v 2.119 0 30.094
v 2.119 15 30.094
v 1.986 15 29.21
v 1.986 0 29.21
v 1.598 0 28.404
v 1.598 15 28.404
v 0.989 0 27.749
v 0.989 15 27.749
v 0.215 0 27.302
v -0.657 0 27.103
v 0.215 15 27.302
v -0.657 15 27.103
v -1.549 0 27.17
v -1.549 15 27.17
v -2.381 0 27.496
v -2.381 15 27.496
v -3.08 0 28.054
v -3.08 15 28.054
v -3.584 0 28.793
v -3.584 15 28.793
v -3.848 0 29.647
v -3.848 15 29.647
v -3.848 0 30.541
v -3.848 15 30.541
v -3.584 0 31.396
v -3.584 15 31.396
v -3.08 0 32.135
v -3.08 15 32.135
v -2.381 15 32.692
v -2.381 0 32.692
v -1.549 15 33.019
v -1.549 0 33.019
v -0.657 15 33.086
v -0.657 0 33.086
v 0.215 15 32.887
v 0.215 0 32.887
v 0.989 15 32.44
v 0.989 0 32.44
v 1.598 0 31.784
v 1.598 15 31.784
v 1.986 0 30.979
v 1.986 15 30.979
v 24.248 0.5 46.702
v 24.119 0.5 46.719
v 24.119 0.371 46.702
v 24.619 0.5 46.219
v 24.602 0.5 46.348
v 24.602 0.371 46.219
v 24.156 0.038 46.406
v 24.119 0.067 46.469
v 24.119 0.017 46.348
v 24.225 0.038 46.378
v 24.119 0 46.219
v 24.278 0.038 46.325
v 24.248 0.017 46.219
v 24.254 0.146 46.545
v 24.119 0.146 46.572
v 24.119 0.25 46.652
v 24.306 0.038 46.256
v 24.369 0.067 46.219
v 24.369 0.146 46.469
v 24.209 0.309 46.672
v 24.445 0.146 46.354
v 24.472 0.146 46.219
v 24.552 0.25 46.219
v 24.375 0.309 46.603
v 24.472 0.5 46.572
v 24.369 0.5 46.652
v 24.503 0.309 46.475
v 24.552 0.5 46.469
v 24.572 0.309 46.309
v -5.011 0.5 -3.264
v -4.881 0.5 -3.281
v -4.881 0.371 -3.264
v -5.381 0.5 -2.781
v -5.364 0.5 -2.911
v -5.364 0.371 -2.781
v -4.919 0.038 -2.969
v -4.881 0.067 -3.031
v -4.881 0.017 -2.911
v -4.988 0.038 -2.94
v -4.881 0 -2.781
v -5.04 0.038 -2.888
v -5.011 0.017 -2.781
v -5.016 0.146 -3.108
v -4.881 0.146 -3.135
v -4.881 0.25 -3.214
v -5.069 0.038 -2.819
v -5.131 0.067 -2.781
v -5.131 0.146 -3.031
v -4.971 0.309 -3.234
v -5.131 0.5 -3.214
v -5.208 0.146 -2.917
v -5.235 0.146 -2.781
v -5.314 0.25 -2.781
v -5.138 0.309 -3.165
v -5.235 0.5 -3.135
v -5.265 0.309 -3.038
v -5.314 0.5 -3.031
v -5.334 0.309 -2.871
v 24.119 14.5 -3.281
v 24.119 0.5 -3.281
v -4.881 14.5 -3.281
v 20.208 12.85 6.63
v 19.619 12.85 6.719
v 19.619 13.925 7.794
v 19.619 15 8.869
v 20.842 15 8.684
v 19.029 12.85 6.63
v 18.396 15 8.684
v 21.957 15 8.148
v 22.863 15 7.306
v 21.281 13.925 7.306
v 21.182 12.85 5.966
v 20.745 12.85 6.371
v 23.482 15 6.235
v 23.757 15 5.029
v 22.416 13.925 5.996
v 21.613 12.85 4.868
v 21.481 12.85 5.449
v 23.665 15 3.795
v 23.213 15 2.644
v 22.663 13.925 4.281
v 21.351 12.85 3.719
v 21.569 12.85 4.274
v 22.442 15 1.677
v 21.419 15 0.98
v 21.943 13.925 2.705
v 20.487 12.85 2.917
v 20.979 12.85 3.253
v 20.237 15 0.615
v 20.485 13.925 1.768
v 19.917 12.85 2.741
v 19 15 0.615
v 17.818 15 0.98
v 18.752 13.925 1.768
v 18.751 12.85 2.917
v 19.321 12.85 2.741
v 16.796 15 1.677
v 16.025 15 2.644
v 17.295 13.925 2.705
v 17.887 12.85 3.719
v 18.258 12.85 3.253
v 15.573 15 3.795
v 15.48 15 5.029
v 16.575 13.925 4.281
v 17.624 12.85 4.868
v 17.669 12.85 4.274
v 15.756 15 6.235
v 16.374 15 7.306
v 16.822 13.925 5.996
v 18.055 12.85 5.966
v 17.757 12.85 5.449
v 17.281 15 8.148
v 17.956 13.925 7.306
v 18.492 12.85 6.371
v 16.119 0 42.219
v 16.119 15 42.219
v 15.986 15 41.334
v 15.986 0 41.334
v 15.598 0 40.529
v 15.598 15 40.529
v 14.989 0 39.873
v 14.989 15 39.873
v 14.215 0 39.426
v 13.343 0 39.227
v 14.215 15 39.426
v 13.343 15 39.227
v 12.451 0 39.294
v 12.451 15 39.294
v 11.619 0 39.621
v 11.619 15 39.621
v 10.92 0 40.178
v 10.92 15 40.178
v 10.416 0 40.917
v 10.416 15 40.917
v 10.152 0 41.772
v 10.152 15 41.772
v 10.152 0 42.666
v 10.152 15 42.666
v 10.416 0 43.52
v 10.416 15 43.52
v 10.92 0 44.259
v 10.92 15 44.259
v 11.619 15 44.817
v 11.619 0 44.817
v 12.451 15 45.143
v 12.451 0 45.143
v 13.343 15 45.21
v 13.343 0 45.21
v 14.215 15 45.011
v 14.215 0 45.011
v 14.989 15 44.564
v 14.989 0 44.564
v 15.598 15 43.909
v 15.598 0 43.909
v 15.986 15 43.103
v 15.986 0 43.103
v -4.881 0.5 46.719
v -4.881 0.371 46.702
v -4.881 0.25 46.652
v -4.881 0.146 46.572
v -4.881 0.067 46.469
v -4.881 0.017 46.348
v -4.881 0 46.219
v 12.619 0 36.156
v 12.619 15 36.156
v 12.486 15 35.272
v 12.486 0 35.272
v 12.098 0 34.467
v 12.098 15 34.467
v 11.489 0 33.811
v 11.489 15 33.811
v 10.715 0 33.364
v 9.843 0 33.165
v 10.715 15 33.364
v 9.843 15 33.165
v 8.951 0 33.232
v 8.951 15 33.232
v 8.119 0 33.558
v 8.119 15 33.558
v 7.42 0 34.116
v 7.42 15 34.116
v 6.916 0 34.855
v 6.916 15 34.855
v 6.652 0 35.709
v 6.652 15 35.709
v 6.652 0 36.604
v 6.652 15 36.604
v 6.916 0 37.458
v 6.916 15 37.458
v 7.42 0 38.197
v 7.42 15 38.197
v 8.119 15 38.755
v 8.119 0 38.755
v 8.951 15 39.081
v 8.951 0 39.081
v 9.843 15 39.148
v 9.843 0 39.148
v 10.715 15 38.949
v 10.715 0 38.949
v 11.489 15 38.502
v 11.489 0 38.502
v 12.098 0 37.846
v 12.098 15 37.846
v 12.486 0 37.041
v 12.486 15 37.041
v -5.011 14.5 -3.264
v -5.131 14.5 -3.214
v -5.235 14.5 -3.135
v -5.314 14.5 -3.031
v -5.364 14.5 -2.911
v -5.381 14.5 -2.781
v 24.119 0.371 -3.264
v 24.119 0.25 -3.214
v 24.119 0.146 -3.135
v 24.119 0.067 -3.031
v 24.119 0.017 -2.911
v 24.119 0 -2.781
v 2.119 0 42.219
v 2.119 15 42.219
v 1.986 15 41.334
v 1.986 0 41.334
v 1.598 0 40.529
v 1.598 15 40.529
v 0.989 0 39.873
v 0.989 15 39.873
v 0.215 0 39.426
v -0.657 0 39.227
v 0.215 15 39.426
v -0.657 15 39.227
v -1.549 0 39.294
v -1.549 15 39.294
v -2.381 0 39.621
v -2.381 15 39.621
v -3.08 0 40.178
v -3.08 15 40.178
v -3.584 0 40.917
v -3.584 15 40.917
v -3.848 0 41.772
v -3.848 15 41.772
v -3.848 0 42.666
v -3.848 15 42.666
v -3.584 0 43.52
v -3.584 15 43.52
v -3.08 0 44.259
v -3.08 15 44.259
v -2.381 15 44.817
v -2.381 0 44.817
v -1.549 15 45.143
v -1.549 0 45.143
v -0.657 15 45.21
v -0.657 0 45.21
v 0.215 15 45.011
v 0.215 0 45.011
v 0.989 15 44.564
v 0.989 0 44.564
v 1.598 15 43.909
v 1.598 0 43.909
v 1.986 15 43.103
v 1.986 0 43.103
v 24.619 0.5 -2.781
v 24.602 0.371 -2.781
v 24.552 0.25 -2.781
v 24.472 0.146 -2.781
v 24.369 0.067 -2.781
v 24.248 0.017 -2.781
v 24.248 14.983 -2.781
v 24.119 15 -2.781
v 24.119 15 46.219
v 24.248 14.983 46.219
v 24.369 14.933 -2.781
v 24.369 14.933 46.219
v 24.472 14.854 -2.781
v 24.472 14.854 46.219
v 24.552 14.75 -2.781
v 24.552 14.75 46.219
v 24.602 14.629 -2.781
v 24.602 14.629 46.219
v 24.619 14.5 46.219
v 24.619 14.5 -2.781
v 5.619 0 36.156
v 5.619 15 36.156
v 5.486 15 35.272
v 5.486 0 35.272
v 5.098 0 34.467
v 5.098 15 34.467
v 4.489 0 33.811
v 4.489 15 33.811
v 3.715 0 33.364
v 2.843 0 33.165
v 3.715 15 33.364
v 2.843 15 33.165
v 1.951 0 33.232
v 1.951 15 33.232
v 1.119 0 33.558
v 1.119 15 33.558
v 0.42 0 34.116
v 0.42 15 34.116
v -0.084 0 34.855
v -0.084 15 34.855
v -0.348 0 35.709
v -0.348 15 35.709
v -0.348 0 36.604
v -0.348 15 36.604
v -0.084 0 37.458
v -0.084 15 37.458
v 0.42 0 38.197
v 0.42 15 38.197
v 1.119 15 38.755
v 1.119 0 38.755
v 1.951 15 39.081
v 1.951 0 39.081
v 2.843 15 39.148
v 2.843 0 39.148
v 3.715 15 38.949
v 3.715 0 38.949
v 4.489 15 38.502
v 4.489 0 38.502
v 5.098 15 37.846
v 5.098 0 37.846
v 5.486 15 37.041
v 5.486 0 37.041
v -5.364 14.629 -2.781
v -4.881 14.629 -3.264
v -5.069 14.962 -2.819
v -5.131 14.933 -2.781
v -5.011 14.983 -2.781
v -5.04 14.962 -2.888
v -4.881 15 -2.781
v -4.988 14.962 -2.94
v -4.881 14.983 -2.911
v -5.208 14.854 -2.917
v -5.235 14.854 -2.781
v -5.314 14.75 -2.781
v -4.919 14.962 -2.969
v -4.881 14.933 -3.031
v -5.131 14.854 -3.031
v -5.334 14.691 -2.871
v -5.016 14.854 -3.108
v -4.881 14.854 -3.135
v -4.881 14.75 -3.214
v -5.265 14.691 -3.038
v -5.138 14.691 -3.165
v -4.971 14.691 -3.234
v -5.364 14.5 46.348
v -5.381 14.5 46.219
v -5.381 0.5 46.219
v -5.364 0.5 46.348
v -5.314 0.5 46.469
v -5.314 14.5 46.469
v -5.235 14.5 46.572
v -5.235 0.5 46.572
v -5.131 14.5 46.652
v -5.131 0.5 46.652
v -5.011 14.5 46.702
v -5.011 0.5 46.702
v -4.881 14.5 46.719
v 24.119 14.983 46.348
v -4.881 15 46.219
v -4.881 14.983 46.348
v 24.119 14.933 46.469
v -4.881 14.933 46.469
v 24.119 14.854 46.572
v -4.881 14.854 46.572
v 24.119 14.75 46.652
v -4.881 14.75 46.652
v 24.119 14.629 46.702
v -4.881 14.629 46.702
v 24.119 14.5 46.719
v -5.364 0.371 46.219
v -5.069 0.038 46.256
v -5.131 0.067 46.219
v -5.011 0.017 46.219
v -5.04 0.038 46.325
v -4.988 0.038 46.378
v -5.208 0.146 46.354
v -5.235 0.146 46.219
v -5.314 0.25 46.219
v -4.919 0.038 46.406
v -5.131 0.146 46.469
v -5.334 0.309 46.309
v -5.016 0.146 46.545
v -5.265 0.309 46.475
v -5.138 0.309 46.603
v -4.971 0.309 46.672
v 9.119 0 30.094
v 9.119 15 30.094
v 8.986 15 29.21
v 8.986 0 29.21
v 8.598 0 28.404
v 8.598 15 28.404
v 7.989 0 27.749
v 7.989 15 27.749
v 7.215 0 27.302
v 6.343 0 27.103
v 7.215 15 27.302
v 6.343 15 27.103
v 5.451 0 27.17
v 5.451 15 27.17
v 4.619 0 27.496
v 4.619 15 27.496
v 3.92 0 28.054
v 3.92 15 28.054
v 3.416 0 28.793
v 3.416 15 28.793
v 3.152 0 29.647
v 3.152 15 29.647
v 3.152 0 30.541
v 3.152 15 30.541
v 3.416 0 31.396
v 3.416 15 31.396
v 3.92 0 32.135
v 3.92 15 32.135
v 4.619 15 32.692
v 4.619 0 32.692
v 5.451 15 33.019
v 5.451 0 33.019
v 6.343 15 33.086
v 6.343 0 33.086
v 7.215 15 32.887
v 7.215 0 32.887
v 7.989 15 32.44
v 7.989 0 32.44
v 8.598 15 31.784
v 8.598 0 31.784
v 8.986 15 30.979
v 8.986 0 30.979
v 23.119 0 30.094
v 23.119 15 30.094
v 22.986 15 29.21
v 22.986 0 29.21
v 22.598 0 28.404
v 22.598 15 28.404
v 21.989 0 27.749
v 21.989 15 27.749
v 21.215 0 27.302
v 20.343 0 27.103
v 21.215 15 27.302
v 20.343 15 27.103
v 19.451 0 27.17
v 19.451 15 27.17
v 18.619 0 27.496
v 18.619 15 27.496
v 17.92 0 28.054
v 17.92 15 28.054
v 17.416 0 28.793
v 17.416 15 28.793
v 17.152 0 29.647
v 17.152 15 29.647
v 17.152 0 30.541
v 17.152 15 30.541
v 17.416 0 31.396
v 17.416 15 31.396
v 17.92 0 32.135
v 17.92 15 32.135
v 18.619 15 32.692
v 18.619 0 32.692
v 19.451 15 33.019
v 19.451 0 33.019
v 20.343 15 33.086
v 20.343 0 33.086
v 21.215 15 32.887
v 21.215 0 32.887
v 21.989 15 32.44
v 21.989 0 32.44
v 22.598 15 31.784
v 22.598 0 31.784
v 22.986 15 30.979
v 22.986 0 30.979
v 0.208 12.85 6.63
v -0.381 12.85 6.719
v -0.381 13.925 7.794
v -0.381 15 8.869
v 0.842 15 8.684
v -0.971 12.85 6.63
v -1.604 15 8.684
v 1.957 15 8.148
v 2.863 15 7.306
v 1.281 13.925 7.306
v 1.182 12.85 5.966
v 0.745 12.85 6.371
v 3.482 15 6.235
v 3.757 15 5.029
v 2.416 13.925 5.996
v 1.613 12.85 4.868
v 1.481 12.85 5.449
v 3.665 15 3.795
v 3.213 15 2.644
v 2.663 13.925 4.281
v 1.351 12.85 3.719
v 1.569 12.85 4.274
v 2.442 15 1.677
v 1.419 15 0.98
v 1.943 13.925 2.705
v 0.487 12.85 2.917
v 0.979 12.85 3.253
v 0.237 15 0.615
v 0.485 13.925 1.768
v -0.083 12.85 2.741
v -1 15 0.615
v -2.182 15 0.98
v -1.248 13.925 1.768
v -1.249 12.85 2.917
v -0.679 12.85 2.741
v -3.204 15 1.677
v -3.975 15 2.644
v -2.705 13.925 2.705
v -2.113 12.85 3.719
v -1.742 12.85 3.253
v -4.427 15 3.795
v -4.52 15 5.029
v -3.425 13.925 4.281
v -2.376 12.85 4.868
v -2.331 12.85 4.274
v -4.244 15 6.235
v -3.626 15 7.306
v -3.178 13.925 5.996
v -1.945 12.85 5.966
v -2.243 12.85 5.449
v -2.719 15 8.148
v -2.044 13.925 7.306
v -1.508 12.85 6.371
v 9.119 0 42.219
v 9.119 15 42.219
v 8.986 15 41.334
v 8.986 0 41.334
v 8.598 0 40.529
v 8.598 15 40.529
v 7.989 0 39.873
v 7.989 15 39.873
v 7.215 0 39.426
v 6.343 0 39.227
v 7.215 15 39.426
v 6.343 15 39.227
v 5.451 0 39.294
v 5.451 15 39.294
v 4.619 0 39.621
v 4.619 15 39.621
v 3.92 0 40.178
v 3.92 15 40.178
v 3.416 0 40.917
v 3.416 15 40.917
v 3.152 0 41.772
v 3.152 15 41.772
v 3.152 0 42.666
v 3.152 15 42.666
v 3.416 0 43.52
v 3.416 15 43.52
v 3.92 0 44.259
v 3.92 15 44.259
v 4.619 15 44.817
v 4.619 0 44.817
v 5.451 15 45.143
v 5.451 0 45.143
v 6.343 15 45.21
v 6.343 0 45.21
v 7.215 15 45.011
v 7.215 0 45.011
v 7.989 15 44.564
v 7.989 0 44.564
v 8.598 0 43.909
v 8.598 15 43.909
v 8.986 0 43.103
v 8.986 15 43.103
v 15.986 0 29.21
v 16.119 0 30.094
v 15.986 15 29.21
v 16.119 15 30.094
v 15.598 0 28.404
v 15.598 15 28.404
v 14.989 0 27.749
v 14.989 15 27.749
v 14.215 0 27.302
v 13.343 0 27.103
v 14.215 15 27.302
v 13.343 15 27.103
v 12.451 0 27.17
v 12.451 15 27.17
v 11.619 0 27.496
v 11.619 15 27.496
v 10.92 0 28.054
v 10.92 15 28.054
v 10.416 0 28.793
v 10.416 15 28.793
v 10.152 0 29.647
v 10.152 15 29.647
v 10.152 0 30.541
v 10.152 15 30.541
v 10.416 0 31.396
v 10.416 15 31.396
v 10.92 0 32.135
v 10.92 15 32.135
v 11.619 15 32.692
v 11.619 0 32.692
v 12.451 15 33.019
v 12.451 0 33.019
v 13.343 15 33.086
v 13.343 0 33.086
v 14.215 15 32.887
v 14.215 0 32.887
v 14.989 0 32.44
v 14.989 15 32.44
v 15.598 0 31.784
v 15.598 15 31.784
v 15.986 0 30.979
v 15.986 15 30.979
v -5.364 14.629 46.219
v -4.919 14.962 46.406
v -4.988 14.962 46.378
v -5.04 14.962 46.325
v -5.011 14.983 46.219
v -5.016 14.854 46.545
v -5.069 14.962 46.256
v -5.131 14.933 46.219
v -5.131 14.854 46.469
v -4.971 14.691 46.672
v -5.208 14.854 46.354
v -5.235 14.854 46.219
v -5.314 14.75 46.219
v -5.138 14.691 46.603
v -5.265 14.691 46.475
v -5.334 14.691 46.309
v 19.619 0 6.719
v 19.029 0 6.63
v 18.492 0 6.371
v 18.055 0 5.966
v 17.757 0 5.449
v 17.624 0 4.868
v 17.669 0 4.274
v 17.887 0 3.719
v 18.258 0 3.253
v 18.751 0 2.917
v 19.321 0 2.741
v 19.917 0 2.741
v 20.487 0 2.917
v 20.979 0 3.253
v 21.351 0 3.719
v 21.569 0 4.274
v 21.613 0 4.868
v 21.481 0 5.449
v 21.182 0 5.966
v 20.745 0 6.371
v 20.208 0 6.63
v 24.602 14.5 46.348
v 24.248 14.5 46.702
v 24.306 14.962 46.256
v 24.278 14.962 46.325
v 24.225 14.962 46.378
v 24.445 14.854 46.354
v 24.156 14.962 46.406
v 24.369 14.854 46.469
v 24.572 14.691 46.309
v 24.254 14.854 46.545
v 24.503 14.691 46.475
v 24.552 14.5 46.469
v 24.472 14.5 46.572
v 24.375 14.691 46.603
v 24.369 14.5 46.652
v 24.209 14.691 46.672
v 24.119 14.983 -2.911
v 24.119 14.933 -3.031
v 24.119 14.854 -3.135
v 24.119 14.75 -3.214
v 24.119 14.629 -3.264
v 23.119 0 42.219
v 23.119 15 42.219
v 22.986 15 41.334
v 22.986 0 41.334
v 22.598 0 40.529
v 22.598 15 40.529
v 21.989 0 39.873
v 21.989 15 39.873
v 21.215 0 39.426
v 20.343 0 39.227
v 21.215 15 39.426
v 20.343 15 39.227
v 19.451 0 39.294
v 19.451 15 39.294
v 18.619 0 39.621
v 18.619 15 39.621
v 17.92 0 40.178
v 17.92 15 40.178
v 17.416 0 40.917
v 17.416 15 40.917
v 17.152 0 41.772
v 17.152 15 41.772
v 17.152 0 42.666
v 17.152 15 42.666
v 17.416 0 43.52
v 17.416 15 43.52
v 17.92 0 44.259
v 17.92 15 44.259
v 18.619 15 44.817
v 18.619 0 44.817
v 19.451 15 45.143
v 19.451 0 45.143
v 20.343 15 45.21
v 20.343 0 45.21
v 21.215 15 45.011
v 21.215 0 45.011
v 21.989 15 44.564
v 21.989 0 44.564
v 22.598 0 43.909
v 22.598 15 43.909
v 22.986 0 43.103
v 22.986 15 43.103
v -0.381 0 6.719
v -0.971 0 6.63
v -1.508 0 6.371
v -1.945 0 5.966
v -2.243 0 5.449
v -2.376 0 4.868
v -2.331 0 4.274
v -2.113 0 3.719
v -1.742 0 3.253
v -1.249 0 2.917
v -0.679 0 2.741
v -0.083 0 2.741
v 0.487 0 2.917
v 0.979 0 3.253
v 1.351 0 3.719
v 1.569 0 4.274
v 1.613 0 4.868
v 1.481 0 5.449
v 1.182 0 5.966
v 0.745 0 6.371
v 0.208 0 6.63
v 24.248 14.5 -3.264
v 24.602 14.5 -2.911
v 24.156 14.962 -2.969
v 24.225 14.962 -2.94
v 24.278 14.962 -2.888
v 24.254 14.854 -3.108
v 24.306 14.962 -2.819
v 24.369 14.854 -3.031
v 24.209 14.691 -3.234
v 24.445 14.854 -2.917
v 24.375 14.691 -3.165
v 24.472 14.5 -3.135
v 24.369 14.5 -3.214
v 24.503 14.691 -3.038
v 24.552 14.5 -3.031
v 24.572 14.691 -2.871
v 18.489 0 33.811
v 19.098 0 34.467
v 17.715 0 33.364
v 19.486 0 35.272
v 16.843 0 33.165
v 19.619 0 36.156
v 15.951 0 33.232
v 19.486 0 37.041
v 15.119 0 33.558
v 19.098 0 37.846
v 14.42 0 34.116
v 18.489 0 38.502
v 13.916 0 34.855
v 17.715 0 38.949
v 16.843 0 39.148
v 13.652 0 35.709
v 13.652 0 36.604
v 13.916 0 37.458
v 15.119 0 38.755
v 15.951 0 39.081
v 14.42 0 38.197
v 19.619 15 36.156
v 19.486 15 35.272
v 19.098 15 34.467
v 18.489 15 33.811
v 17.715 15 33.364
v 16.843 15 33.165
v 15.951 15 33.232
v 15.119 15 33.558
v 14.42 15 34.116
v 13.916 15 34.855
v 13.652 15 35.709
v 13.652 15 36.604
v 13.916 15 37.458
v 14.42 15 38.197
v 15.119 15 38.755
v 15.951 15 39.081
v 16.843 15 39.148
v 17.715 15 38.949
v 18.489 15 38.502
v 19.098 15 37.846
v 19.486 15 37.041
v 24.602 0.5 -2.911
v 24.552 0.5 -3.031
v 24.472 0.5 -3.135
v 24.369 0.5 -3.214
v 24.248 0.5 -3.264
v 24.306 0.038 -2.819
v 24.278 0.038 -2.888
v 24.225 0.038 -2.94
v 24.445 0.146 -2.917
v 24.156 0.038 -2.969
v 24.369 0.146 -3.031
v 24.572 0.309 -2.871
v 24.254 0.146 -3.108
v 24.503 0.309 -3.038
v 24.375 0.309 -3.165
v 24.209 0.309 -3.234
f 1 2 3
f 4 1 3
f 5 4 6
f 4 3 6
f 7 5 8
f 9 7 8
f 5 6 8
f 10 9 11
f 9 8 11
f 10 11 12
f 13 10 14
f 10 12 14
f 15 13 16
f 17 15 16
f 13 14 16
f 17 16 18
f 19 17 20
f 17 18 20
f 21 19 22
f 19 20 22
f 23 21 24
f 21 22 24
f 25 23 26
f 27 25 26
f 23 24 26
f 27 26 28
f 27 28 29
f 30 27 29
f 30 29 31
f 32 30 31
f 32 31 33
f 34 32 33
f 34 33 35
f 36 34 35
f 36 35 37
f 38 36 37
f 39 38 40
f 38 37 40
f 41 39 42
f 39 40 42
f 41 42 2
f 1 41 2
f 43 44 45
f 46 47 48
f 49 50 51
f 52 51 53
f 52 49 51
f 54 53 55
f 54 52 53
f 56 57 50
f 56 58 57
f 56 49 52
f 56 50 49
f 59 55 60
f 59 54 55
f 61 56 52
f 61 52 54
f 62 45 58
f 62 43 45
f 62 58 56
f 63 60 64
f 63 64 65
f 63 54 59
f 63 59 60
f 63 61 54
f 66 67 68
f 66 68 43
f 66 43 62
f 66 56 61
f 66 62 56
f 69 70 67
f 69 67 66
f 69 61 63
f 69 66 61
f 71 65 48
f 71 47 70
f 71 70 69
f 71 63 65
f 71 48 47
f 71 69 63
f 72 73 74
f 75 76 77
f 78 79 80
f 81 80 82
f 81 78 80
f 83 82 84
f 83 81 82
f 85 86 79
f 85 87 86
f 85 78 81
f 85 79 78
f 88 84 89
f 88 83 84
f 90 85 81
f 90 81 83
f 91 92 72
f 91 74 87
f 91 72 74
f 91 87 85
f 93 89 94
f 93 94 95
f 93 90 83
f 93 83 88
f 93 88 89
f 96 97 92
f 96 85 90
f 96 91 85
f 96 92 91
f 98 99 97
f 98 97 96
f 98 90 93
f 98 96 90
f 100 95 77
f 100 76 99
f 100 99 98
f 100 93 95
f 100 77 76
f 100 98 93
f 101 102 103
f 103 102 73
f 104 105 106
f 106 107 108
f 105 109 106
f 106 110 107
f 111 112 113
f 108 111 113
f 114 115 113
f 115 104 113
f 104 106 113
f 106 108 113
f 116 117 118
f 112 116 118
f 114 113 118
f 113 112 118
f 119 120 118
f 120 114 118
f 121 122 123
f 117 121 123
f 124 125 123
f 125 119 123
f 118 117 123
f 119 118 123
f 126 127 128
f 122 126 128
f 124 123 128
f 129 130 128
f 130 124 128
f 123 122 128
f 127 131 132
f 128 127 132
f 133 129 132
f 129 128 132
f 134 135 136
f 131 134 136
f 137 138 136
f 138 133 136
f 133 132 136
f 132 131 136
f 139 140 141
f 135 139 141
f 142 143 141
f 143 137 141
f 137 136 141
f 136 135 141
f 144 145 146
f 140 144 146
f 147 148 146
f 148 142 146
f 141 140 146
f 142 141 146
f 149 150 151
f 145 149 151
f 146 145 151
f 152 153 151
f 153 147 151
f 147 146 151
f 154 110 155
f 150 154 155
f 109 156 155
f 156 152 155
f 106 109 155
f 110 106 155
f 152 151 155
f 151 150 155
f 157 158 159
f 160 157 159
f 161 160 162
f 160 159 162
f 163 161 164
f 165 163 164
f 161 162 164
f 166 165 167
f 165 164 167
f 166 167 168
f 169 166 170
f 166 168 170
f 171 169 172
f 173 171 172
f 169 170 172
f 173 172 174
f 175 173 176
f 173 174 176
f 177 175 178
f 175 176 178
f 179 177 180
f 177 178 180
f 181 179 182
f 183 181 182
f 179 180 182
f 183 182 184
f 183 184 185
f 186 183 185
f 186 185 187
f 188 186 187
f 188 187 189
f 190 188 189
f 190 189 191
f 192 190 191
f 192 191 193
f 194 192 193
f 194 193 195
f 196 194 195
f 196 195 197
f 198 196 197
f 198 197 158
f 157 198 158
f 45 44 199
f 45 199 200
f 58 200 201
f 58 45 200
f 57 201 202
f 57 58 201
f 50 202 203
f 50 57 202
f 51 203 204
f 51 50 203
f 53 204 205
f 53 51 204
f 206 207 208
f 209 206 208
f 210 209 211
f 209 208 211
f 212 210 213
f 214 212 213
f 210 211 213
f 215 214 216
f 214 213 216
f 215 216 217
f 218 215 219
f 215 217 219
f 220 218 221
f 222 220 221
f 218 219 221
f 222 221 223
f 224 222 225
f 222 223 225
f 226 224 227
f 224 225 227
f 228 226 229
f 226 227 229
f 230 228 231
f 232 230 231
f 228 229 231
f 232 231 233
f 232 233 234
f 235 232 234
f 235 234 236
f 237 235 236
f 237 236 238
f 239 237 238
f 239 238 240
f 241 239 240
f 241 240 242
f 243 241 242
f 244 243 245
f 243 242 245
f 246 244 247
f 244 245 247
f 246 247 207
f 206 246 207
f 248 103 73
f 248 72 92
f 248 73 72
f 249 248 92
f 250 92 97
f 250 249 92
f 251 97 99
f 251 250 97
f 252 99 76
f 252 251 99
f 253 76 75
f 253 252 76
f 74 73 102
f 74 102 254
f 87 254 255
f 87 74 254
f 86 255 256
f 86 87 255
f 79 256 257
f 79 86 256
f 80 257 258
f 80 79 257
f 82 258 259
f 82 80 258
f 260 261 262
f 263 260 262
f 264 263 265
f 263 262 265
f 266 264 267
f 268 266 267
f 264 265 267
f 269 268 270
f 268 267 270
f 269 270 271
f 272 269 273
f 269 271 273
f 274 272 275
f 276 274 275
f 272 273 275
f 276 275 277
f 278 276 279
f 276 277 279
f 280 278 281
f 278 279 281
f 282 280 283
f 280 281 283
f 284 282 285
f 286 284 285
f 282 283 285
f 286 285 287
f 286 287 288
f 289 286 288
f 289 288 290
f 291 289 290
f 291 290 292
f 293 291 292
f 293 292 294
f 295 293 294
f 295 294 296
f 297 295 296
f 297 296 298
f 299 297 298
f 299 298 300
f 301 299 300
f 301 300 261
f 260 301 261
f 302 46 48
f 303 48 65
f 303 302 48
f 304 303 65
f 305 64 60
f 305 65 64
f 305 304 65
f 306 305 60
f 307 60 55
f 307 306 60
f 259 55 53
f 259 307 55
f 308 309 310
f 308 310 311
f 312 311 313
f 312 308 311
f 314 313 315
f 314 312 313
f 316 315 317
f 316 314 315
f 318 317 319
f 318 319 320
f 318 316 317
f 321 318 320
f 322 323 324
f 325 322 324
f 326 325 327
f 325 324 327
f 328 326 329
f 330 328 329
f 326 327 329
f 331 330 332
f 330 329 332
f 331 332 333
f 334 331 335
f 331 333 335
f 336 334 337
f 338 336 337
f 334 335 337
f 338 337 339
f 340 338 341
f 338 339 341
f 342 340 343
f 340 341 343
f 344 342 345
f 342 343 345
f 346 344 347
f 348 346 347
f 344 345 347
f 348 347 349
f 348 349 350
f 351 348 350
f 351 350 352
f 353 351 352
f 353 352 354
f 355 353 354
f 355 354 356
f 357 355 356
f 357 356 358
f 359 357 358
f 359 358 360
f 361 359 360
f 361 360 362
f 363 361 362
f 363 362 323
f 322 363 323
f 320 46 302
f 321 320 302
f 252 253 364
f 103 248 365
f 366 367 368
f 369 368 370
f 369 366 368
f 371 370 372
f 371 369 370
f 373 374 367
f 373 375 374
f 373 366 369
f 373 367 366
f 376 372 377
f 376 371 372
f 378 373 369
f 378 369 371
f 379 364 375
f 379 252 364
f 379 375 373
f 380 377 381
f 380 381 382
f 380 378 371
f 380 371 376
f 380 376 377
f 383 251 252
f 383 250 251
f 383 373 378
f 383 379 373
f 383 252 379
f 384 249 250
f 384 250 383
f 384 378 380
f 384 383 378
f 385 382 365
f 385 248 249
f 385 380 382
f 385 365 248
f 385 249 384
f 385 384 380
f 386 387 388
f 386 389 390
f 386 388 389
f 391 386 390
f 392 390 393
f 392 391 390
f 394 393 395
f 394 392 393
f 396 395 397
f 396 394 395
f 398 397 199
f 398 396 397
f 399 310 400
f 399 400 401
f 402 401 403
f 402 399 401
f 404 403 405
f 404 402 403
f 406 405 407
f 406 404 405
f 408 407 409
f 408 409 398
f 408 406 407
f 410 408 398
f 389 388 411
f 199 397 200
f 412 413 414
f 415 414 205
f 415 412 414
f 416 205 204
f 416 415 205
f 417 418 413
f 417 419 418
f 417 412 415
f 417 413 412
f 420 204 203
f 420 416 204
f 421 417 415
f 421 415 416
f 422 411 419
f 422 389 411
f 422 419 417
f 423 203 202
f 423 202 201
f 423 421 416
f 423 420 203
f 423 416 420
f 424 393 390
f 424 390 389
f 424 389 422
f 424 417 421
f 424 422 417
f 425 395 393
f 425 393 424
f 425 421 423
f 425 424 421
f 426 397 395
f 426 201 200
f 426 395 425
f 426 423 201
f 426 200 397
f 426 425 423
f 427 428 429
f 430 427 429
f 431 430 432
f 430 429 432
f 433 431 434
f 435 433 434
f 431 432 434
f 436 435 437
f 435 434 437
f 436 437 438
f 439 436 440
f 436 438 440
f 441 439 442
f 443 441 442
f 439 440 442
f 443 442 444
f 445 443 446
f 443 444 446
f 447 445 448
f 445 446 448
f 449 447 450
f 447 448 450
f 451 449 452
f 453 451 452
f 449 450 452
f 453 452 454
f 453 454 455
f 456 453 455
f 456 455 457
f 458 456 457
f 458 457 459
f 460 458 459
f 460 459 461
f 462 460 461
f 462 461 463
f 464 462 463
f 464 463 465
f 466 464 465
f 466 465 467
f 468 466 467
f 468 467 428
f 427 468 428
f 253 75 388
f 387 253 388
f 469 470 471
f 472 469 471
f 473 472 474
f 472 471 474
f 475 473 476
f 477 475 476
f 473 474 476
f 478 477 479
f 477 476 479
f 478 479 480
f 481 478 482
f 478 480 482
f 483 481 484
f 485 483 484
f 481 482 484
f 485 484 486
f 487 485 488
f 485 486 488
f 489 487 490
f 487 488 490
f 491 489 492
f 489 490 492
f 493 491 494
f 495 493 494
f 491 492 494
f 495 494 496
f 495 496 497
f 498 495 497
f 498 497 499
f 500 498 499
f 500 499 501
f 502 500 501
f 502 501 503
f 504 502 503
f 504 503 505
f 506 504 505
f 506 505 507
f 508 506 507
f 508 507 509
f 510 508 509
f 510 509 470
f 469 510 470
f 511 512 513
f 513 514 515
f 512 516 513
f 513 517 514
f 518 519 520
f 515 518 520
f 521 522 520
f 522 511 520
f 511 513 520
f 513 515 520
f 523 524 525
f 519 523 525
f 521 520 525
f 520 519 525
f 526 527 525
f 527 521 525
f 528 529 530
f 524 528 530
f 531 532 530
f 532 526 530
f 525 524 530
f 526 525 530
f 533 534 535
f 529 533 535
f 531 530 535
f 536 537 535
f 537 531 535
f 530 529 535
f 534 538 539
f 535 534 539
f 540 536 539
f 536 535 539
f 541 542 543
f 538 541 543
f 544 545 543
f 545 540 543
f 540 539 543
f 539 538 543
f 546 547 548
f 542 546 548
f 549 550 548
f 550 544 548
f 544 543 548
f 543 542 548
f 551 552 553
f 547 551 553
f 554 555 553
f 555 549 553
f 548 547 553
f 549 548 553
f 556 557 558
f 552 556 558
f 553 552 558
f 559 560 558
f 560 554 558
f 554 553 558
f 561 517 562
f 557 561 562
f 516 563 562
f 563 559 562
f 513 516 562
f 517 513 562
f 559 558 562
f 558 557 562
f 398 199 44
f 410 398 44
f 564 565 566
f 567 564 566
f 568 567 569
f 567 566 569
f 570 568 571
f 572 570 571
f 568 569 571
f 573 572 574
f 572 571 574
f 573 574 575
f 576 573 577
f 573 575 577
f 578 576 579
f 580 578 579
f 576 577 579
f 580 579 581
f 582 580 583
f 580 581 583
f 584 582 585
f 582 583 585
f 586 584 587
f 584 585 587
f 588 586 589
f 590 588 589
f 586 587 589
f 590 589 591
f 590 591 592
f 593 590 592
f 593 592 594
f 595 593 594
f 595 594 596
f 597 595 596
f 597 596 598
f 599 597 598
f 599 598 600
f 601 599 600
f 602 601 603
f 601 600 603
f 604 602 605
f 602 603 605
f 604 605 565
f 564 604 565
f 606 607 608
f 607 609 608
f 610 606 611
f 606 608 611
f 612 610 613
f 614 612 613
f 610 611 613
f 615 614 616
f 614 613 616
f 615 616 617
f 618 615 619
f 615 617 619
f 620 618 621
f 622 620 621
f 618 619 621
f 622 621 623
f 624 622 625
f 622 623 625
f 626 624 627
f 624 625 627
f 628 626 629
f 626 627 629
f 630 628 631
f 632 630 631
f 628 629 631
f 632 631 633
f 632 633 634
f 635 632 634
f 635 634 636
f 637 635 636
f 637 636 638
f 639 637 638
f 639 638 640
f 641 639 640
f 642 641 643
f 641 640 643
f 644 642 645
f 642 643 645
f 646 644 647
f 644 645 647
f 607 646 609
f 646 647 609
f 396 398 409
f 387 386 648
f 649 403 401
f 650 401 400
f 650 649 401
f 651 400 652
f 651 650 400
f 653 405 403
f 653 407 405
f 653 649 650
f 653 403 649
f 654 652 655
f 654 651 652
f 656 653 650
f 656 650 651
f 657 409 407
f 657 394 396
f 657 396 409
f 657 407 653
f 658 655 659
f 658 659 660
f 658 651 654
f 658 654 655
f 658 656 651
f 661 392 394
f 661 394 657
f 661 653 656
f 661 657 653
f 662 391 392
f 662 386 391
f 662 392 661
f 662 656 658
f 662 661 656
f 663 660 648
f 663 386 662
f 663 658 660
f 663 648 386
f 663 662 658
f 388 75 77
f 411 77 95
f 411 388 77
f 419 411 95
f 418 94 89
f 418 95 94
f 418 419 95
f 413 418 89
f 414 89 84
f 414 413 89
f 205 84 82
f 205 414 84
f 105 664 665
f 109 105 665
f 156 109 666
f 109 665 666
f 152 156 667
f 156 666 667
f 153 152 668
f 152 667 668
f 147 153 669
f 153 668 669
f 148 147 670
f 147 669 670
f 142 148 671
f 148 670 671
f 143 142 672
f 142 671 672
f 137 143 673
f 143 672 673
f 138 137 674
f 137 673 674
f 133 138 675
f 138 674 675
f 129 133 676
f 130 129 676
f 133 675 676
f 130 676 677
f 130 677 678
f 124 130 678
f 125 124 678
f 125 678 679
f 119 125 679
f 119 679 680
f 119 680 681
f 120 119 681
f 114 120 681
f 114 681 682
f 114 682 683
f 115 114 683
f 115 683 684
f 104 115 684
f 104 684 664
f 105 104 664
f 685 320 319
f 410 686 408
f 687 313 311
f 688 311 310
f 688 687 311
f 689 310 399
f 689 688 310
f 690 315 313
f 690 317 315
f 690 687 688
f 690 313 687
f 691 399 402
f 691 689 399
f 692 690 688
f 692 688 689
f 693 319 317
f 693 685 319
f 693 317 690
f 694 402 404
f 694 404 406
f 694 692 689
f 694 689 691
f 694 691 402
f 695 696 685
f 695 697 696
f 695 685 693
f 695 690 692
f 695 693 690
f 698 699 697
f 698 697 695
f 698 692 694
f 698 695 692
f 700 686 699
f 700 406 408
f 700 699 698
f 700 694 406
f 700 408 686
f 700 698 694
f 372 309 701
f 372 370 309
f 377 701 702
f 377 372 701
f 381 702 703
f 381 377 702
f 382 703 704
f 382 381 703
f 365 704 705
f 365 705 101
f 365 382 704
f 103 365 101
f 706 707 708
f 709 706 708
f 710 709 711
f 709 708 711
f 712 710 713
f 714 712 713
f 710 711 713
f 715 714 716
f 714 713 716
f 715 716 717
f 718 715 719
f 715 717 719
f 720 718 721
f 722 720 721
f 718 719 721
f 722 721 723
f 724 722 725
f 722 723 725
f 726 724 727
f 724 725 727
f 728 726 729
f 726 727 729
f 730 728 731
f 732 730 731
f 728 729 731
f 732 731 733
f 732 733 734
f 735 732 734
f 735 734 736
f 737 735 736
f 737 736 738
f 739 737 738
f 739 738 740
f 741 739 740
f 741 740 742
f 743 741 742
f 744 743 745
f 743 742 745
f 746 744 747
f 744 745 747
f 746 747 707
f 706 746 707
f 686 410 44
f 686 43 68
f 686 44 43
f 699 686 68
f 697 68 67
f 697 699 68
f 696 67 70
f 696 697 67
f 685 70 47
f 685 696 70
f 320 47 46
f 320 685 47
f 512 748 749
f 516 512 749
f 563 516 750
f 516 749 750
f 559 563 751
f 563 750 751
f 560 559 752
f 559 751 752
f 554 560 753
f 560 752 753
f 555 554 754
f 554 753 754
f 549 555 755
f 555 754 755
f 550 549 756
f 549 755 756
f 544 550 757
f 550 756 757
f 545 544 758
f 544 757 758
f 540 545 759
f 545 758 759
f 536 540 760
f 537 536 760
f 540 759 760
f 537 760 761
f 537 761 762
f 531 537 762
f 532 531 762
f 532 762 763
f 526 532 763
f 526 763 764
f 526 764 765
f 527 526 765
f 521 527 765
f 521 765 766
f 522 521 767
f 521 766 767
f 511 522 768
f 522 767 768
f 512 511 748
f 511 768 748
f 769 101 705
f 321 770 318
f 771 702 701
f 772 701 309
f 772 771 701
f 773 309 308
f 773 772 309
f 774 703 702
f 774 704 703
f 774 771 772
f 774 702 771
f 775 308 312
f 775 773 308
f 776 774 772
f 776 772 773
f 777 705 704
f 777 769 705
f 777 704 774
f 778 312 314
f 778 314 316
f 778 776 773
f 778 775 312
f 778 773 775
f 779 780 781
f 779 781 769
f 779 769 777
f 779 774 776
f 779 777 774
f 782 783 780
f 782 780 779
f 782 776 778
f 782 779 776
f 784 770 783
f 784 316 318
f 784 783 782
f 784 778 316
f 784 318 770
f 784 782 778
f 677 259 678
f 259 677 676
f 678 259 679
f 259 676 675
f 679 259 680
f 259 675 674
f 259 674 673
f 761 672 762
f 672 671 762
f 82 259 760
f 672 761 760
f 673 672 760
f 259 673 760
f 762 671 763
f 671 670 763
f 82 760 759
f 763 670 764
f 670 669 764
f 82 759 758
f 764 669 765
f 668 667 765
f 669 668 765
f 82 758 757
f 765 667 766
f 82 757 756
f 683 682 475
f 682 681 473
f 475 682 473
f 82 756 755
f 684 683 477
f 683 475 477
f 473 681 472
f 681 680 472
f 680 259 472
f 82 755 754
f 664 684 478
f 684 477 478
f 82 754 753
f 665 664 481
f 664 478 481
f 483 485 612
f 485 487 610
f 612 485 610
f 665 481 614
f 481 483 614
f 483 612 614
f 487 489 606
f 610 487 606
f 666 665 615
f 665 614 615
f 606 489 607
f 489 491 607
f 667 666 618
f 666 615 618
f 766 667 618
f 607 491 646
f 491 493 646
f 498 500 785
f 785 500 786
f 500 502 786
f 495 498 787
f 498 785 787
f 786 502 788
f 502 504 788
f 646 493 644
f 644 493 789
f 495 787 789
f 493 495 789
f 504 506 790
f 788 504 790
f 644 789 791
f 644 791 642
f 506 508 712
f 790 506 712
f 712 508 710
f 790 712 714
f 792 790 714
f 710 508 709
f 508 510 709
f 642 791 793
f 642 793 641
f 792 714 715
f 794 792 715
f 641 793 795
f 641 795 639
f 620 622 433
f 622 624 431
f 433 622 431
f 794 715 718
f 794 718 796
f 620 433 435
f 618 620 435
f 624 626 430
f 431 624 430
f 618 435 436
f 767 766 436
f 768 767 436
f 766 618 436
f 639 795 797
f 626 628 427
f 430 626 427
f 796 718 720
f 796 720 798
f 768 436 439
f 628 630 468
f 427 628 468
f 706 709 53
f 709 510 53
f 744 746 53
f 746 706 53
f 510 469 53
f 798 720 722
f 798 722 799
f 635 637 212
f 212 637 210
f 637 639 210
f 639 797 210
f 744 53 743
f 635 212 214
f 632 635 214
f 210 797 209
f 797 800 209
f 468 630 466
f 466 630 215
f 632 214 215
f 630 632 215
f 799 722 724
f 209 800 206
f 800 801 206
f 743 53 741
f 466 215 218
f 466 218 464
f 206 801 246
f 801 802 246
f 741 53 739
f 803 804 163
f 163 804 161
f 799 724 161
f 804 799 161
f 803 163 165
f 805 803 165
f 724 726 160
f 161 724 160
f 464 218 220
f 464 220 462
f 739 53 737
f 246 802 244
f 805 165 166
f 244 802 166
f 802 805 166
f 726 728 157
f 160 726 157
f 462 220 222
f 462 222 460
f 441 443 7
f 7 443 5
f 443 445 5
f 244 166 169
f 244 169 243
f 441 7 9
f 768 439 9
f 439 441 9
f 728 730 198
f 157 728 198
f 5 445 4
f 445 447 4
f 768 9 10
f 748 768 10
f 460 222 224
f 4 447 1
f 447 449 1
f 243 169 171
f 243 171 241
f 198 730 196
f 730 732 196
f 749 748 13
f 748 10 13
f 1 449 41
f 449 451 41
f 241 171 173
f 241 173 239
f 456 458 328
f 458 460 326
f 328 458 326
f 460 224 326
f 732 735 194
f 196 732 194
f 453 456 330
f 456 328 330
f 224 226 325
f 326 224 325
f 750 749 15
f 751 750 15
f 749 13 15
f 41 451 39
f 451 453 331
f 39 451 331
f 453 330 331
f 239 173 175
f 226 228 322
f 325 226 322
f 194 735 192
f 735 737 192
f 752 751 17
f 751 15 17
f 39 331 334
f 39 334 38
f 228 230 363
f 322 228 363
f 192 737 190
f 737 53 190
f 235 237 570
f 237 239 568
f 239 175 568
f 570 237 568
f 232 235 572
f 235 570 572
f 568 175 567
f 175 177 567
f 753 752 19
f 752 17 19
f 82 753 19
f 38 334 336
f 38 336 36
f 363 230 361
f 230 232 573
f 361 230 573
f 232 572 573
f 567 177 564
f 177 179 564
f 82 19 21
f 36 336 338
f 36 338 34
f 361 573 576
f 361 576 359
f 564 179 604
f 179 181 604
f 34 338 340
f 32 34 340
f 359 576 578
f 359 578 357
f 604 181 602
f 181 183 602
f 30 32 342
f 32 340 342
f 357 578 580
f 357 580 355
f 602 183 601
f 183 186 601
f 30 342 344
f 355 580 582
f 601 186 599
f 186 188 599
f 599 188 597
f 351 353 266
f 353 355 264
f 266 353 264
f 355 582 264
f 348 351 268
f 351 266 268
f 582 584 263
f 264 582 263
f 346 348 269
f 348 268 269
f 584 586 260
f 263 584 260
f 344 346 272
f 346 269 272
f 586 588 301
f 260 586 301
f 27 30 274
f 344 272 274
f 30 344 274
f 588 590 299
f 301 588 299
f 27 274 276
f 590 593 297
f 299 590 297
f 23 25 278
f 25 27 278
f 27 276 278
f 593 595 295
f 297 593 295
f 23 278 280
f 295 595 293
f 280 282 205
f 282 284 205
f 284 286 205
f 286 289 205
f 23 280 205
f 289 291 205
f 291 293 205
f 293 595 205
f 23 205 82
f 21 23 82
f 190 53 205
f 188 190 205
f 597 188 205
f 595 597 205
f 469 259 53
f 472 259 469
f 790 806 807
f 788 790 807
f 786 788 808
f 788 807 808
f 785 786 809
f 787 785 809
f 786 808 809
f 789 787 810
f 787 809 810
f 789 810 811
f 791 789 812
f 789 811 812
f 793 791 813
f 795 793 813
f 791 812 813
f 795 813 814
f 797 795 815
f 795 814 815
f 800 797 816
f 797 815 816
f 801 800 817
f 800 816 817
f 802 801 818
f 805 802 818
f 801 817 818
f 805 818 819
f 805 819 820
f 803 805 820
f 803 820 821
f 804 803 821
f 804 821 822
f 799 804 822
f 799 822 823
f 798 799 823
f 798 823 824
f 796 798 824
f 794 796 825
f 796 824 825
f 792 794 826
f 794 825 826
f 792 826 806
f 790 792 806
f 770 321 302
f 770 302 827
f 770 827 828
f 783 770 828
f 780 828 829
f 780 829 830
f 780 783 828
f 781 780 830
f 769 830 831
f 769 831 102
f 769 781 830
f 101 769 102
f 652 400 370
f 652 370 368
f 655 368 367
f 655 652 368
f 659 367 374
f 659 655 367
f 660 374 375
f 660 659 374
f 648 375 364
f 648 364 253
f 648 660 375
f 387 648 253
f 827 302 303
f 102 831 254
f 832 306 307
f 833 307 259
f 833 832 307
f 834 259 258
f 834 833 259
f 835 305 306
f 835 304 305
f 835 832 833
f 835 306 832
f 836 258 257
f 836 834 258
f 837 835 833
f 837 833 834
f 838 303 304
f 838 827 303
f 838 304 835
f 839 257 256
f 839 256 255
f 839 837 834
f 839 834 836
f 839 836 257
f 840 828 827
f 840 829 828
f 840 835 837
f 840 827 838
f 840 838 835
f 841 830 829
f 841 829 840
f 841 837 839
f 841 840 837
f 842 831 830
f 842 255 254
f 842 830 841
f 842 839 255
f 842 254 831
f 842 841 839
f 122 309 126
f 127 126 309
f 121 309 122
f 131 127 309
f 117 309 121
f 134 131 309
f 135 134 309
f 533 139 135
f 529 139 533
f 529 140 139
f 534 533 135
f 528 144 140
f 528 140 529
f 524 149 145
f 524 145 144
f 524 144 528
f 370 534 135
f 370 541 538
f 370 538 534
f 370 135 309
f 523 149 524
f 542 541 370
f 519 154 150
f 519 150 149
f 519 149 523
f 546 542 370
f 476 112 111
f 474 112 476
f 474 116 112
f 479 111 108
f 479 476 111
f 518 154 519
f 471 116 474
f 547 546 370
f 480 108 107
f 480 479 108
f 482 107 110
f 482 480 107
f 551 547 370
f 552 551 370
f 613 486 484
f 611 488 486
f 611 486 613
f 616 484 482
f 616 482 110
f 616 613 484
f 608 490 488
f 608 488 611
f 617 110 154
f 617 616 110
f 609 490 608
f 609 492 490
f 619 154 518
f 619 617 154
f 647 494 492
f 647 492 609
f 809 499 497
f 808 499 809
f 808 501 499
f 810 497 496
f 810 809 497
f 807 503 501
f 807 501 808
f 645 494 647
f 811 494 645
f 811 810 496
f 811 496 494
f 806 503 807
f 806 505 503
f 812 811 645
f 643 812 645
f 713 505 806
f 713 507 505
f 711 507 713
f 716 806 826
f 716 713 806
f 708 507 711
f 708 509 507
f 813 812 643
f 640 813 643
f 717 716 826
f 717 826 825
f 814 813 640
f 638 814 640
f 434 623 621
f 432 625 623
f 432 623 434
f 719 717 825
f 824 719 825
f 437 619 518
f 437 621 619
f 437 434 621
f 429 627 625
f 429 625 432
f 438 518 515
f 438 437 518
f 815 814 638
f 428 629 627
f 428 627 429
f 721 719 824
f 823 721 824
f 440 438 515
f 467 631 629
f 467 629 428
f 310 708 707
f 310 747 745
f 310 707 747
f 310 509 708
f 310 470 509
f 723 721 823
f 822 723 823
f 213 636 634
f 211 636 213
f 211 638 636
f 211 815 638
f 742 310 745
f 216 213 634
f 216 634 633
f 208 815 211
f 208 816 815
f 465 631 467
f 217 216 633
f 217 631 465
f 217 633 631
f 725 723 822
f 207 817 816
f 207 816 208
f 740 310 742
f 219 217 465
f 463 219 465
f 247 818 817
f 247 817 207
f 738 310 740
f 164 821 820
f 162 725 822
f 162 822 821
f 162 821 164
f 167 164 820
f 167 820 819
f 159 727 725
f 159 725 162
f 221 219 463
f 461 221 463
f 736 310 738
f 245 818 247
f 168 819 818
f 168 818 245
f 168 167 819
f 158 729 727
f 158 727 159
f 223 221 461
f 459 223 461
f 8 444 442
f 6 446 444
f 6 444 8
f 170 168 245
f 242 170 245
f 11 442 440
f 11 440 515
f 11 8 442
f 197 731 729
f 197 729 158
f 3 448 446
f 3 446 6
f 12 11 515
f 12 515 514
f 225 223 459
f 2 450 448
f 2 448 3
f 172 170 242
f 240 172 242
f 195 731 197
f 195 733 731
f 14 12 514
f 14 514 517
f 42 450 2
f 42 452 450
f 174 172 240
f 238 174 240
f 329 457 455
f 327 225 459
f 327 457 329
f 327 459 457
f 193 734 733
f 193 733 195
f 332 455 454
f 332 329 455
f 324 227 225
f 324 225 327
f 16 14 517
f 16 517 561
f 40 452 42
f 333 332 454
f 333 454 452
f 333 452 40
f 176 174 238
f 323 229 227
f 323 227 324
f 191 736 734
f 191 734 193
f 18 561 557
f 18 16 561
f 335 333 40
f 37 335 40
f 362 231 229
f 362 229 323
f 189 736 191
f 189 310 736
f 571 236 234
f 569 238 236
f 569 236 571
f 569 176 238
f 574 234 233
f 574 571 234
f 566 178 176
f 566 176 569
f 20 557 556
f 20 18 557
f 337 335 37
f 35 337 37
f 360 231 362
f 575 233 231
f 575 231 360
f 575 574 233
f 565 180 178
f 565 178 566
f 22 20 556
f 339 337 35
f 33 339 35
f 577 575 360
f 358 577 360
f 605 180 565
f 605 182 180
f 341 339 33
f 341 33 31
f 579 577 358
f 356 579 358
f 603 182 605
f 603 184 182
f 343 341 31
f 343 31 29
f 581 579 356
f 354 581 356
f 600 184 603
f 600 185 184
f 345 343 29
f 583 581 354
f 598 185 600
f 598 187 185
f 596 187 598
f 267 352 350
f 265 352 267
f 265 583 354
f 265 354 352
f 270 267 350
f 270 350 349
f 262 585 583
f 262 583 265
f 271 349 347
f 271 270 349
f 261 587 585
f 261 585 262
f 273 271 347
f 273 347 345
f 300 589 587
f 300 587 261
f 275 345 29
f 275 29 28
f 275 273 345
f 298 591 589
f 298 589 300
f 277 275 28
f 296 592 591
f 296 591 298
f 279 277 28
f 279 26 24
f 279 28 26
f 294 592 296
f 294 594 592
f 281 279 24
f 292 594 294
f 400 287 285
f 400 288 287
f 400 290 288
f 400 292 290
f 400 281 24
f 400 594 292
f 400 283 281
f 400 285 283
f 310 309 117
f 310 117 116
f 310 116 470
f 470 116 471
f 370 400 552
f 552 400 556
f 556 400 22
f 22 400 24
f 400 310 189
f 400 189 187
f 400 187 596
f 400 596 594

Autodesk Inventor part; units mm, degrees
ref_plane "YZ Plane" through (0, 0, 0) normal (1, 0, 0) x (0, 1, 0)
ref_plane "XZ Plane" through (0, 0, 0) normal (0, 1, 0) x (-1, 0, 0)
ref_plane "XY Plane" through (0, 0, 0) normal (0, 0, 1) x (1, 0, 0)
sketch "Skizze1" plane through (0, 0, 0) normal (0, 1, 0) x (-1, 0, 0)
  line L0 (-24.6188, -3.2813) -> (5.3812, -3.2813)
  line L1 (5.3812, -3.2813) -> (5.3812, 46.7188)
  line L2 (5.3812, 46.7188) -> (-24.6188, 46.7188)
  line L3 (-24.6188, 46.7188) -> (-24.6188, -3.2813)
  line L4 (-24.6188, -3.2813) -> (5.3812, 46.7188) construction
  line L5 (5.3812, -3.2813) -> (-24.6188, 46.7188) construction
  point P0 (0, 0)
  point P1 (-9.6188, 21.7188)
  dimension "d5" = 50
  dimension "d7" = 30
extrude "Extrusion1" add sketch "Skizze1" along normal blind 15
fillet "Rundung1" radius 0.5 12 edges at (24.6188, 7.5, 46.7188) (24.6188, 7.5, -3.2813) (24.6188, 0, 21.7188) (24.6188, 15, 21.7188) (-5.3812, 7.5, 46.7188) (9.6188, 0, 46.7188) (9.6188, 15, 46.7188) (-5.3812, 7.5, -3.2813) (-5.3812, 0, 21.7187) (-5.3812, 15, 21.7187) (9.6188, 0, -3.2813) (9.6188, 15, -3.2813)
sketch "Skizze2" plane through (-4.8812, 15, -2.7813) normal (0, 1, 0) x (1, 0, 0)
  line L0 (29, -49) -> (0, -49) projected
  circle A0 centre (25, -45) radius 3
  circle A1 centre (21.5, -38.9378) radius 3
  line L1 (29.5, -49) -> (29.5, 0) construction
  line L2 (0, -49.5) -> (29, -49.5) construction
  circle A2 centre (18, -45) radius 3
  circle A3 centre (11, -45) radius 3
  circle A4 centre (4, -45) radius 3
  circle A5 centre (25, -32.8756) radius 3
  circle A6 centre (14.5, -38.9378) radius 3
  circle A7 centre (7.5, -38.9378) radius 3
  circle A8 centre (18, -32.8756) radius 3
  circle A9 centre (11, -32.8756) radius 3
  circle A10 centre (4, -32.8756) radius 3
  point P0 (4.8812, -2.7813)
  dimension "d9" = 6
  dimension "d66" = 7
  dimension "d81" = 4.5
  dimension "d82" = 4.5
  dimension "d86" = 7
  dimension "d93" = 7
  dimension "d112" = 0
  dimension "d113" = 1
  dimension "d115" = 1
  dimension "d116" = 1
  dimension "d117" = 6.0622
extrude "Extrusion2" cut sketch "Skizze2" against normal through all
sketch "Skizze3" plane through (0, 15, 0) normal (0, 1, 0) x (1, 0, 0)
  circle A0 centre (-0.3812, -4.7187) radius 2
  circle A1 centre (19.6188, -4.7187) radius 2
  line L0 (24.1188, 3.2813) -> (-4.8812, 3.2813) projected
  line L1 (24.6188, -46.2187) -> (24.6188, 2.7813) projected
  line L2 (-5.3812, 2.7813) -> (-5.3812, -46.2188) projected
  point P0 (0, 0)
  dimension "d40" = 4
  dimension "d43" = 4
  dimension "d105" = 8
  dimension "d106" = 8
  dimension "d107" = 5
  dimension "d108" = 5
  dimension "d118" = 20
hole "Bohrung1" at (-0.3812, 15, 4.7187) at (19.6188, 15, 4.7187) direction (0, -1, 0) diameter 4 end through all countersink diameter 8.3 countersink angle 90
properties part number "Schlauchhalter"
